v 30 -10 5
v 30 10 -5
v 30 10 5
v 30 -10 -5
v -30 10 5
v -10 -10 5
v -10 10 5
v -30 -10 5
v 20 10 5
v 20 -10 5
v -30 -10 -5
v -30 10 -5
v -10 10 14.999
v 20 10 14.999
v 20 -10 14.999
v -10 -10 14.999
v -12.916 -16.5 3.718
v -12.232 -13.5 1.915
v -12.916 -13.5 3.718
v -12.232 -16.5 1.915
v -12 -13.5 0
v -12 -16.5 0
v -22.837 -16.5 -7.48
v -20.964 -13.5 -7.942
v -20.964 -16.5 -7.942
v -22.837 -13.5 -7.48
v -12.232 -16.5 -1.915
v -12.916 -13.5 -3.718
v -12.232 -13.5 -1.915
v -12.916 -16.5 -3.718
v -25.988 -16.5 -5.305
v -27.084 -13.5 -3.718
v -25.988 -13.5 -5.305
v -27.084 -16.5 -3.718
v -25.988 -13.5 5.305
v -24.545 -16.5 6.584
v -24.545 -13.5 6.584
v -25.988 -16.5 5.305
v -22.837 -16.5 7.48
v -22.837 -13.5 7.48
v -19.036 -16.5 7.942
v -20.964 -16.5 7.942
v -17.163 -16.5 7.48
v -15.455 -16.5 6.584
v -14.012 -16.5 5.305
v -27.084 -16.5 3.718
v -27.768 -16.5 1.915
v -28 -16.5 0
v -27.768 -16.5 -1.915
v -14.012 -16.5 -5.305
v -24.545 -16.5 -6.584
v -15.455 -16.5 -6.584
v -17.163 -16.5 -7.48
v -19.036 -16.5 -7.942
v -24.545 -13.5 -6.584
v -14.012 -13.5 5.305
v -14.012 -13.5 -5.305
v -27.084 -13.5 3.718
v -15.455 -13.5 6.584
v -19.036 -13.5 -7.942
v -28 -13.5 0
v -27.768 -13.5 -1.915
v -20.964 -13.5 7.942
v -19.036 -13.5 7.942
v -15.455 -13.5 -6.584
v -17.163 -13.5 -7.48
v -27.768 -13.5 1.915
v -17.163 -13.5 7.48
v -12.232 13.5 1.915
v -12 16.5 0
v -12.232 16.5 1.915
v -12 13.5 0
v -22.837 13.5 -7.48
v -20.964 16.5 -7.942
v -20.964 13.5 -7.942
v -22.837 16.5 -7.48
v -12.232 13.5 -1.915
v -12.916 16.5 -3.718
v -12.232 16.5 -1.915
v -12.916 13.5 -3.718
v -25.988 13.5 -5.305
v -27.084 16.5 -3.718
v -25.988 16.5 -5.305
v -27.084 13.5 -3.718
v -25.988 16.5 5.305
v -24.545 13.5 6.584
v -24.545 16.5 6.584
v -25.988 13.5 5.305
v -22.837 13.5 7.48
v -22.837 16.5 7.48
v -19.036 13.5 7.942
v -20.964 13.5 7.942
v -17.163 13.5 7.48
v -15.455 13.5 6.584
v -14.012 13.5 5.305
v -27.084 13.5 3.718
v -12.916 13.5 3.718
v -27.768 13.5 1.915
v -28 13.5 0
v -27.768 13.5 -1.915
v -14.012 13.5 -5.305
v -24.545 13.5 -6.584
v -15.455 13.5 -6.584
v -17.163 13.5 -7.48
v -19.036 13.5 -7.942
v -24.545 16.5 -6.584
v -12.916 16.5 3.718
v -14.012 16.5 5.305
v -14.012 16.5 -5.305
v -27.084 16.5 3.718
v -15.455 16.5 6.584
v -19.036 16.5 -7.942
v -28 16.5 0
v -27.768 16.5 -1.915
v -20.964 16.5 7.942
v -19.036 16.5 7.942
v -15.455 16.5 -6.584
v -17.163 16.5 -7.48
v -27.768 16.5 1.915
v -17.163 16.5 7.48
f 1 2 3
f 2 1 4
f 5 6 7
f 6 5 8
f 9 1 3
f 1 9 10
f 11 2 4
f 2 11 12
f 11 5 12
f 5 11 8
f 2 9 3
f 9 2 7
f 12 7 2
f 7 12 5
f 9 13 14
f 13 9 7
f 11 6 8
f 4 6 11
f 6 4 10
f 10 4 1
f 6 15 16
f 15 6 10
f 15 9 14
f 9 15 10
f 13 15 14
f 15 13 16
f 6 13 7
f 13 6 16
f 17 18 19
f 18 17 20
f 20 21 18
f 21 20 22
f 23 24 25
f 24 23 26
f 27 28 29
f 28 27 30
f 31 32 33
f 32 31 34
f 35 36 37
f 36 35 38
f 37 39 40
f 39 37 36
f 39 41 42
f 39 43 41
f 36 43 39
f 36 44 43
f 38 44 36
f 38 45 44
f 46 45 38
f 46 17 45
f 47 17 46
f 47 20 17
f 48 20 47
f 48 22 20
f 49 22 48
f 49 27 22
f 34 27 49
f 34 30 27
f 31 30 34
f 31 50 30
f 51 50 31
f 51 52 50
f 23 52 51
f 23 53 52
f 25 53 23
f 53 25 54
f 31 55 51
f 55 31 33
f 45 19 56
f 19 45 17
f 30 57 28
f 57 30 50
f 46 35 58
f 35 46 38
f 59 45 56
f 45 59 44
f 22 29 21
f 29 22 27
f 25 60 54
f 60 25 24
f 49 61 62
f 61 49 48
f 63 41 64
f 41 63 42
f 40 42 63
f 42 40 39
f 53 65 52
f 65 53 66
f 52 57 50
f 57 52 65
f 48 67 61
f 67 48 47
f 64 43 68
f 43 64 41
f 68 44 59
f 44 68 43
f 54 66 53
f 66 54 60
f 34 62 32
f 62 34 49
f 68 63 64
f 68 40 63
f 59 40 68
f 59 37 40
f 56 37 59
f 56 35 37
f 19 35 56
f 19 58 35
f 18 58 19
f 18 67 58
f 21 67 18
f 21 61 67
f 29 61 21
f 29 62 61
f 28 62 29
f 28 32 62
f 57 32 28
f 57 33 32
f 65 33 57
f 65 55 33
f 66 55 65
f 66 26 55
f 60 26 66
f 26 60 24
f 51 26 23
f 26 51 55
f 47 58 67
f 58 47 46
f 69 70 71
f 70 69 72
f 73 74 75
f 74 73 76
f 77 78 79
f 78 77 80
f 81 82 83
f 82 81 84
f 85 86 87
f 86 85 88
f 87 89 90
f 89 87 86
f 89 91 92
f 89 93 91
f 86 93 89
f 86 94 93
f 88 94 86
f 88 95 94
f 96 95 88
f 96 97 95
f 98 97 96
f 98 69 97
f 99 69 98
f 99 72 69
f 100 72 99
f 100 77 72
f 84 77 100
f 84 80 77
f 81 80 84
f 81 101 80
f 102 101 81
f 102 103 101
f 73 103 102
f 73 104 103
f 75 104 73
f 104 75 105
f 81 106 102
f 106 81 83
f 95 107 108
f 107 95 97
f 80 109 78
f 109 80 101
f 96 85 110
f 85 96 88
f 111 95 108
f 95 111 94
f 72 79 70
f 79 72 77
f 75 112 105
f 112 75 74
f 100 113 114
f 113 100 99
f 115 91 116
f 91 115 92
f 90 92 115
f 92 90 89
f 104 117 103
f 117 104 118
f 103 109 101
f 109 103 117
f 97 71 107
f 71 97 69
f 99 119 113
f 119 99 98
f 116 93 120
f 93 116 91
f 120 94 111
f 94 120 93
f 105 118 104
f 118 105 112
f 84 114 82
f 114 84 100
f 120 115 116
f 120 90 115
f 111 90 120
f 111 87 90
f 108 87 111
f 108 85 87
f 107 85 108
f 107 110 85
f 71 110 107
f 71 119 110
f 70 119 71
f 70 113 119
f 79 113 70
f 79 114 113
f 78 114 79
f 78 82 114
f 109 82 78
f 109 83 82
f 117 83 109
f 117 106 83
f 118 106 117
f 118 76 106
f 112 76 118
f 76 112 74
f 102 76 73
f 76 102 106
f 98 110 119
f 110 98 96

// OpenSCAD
cube([60,20,10],center=true);
translate([5,0,10 - 0.001])
    cube([30,20,10],center=true);
translate([-20,-15,0])
    rotate([90,0,0])
    cylinder(h=3,r=8,center=true);
translate([-20,15,0])
    rotate([90,0,0])
    cylinder(h=3,r=8,center=true);
